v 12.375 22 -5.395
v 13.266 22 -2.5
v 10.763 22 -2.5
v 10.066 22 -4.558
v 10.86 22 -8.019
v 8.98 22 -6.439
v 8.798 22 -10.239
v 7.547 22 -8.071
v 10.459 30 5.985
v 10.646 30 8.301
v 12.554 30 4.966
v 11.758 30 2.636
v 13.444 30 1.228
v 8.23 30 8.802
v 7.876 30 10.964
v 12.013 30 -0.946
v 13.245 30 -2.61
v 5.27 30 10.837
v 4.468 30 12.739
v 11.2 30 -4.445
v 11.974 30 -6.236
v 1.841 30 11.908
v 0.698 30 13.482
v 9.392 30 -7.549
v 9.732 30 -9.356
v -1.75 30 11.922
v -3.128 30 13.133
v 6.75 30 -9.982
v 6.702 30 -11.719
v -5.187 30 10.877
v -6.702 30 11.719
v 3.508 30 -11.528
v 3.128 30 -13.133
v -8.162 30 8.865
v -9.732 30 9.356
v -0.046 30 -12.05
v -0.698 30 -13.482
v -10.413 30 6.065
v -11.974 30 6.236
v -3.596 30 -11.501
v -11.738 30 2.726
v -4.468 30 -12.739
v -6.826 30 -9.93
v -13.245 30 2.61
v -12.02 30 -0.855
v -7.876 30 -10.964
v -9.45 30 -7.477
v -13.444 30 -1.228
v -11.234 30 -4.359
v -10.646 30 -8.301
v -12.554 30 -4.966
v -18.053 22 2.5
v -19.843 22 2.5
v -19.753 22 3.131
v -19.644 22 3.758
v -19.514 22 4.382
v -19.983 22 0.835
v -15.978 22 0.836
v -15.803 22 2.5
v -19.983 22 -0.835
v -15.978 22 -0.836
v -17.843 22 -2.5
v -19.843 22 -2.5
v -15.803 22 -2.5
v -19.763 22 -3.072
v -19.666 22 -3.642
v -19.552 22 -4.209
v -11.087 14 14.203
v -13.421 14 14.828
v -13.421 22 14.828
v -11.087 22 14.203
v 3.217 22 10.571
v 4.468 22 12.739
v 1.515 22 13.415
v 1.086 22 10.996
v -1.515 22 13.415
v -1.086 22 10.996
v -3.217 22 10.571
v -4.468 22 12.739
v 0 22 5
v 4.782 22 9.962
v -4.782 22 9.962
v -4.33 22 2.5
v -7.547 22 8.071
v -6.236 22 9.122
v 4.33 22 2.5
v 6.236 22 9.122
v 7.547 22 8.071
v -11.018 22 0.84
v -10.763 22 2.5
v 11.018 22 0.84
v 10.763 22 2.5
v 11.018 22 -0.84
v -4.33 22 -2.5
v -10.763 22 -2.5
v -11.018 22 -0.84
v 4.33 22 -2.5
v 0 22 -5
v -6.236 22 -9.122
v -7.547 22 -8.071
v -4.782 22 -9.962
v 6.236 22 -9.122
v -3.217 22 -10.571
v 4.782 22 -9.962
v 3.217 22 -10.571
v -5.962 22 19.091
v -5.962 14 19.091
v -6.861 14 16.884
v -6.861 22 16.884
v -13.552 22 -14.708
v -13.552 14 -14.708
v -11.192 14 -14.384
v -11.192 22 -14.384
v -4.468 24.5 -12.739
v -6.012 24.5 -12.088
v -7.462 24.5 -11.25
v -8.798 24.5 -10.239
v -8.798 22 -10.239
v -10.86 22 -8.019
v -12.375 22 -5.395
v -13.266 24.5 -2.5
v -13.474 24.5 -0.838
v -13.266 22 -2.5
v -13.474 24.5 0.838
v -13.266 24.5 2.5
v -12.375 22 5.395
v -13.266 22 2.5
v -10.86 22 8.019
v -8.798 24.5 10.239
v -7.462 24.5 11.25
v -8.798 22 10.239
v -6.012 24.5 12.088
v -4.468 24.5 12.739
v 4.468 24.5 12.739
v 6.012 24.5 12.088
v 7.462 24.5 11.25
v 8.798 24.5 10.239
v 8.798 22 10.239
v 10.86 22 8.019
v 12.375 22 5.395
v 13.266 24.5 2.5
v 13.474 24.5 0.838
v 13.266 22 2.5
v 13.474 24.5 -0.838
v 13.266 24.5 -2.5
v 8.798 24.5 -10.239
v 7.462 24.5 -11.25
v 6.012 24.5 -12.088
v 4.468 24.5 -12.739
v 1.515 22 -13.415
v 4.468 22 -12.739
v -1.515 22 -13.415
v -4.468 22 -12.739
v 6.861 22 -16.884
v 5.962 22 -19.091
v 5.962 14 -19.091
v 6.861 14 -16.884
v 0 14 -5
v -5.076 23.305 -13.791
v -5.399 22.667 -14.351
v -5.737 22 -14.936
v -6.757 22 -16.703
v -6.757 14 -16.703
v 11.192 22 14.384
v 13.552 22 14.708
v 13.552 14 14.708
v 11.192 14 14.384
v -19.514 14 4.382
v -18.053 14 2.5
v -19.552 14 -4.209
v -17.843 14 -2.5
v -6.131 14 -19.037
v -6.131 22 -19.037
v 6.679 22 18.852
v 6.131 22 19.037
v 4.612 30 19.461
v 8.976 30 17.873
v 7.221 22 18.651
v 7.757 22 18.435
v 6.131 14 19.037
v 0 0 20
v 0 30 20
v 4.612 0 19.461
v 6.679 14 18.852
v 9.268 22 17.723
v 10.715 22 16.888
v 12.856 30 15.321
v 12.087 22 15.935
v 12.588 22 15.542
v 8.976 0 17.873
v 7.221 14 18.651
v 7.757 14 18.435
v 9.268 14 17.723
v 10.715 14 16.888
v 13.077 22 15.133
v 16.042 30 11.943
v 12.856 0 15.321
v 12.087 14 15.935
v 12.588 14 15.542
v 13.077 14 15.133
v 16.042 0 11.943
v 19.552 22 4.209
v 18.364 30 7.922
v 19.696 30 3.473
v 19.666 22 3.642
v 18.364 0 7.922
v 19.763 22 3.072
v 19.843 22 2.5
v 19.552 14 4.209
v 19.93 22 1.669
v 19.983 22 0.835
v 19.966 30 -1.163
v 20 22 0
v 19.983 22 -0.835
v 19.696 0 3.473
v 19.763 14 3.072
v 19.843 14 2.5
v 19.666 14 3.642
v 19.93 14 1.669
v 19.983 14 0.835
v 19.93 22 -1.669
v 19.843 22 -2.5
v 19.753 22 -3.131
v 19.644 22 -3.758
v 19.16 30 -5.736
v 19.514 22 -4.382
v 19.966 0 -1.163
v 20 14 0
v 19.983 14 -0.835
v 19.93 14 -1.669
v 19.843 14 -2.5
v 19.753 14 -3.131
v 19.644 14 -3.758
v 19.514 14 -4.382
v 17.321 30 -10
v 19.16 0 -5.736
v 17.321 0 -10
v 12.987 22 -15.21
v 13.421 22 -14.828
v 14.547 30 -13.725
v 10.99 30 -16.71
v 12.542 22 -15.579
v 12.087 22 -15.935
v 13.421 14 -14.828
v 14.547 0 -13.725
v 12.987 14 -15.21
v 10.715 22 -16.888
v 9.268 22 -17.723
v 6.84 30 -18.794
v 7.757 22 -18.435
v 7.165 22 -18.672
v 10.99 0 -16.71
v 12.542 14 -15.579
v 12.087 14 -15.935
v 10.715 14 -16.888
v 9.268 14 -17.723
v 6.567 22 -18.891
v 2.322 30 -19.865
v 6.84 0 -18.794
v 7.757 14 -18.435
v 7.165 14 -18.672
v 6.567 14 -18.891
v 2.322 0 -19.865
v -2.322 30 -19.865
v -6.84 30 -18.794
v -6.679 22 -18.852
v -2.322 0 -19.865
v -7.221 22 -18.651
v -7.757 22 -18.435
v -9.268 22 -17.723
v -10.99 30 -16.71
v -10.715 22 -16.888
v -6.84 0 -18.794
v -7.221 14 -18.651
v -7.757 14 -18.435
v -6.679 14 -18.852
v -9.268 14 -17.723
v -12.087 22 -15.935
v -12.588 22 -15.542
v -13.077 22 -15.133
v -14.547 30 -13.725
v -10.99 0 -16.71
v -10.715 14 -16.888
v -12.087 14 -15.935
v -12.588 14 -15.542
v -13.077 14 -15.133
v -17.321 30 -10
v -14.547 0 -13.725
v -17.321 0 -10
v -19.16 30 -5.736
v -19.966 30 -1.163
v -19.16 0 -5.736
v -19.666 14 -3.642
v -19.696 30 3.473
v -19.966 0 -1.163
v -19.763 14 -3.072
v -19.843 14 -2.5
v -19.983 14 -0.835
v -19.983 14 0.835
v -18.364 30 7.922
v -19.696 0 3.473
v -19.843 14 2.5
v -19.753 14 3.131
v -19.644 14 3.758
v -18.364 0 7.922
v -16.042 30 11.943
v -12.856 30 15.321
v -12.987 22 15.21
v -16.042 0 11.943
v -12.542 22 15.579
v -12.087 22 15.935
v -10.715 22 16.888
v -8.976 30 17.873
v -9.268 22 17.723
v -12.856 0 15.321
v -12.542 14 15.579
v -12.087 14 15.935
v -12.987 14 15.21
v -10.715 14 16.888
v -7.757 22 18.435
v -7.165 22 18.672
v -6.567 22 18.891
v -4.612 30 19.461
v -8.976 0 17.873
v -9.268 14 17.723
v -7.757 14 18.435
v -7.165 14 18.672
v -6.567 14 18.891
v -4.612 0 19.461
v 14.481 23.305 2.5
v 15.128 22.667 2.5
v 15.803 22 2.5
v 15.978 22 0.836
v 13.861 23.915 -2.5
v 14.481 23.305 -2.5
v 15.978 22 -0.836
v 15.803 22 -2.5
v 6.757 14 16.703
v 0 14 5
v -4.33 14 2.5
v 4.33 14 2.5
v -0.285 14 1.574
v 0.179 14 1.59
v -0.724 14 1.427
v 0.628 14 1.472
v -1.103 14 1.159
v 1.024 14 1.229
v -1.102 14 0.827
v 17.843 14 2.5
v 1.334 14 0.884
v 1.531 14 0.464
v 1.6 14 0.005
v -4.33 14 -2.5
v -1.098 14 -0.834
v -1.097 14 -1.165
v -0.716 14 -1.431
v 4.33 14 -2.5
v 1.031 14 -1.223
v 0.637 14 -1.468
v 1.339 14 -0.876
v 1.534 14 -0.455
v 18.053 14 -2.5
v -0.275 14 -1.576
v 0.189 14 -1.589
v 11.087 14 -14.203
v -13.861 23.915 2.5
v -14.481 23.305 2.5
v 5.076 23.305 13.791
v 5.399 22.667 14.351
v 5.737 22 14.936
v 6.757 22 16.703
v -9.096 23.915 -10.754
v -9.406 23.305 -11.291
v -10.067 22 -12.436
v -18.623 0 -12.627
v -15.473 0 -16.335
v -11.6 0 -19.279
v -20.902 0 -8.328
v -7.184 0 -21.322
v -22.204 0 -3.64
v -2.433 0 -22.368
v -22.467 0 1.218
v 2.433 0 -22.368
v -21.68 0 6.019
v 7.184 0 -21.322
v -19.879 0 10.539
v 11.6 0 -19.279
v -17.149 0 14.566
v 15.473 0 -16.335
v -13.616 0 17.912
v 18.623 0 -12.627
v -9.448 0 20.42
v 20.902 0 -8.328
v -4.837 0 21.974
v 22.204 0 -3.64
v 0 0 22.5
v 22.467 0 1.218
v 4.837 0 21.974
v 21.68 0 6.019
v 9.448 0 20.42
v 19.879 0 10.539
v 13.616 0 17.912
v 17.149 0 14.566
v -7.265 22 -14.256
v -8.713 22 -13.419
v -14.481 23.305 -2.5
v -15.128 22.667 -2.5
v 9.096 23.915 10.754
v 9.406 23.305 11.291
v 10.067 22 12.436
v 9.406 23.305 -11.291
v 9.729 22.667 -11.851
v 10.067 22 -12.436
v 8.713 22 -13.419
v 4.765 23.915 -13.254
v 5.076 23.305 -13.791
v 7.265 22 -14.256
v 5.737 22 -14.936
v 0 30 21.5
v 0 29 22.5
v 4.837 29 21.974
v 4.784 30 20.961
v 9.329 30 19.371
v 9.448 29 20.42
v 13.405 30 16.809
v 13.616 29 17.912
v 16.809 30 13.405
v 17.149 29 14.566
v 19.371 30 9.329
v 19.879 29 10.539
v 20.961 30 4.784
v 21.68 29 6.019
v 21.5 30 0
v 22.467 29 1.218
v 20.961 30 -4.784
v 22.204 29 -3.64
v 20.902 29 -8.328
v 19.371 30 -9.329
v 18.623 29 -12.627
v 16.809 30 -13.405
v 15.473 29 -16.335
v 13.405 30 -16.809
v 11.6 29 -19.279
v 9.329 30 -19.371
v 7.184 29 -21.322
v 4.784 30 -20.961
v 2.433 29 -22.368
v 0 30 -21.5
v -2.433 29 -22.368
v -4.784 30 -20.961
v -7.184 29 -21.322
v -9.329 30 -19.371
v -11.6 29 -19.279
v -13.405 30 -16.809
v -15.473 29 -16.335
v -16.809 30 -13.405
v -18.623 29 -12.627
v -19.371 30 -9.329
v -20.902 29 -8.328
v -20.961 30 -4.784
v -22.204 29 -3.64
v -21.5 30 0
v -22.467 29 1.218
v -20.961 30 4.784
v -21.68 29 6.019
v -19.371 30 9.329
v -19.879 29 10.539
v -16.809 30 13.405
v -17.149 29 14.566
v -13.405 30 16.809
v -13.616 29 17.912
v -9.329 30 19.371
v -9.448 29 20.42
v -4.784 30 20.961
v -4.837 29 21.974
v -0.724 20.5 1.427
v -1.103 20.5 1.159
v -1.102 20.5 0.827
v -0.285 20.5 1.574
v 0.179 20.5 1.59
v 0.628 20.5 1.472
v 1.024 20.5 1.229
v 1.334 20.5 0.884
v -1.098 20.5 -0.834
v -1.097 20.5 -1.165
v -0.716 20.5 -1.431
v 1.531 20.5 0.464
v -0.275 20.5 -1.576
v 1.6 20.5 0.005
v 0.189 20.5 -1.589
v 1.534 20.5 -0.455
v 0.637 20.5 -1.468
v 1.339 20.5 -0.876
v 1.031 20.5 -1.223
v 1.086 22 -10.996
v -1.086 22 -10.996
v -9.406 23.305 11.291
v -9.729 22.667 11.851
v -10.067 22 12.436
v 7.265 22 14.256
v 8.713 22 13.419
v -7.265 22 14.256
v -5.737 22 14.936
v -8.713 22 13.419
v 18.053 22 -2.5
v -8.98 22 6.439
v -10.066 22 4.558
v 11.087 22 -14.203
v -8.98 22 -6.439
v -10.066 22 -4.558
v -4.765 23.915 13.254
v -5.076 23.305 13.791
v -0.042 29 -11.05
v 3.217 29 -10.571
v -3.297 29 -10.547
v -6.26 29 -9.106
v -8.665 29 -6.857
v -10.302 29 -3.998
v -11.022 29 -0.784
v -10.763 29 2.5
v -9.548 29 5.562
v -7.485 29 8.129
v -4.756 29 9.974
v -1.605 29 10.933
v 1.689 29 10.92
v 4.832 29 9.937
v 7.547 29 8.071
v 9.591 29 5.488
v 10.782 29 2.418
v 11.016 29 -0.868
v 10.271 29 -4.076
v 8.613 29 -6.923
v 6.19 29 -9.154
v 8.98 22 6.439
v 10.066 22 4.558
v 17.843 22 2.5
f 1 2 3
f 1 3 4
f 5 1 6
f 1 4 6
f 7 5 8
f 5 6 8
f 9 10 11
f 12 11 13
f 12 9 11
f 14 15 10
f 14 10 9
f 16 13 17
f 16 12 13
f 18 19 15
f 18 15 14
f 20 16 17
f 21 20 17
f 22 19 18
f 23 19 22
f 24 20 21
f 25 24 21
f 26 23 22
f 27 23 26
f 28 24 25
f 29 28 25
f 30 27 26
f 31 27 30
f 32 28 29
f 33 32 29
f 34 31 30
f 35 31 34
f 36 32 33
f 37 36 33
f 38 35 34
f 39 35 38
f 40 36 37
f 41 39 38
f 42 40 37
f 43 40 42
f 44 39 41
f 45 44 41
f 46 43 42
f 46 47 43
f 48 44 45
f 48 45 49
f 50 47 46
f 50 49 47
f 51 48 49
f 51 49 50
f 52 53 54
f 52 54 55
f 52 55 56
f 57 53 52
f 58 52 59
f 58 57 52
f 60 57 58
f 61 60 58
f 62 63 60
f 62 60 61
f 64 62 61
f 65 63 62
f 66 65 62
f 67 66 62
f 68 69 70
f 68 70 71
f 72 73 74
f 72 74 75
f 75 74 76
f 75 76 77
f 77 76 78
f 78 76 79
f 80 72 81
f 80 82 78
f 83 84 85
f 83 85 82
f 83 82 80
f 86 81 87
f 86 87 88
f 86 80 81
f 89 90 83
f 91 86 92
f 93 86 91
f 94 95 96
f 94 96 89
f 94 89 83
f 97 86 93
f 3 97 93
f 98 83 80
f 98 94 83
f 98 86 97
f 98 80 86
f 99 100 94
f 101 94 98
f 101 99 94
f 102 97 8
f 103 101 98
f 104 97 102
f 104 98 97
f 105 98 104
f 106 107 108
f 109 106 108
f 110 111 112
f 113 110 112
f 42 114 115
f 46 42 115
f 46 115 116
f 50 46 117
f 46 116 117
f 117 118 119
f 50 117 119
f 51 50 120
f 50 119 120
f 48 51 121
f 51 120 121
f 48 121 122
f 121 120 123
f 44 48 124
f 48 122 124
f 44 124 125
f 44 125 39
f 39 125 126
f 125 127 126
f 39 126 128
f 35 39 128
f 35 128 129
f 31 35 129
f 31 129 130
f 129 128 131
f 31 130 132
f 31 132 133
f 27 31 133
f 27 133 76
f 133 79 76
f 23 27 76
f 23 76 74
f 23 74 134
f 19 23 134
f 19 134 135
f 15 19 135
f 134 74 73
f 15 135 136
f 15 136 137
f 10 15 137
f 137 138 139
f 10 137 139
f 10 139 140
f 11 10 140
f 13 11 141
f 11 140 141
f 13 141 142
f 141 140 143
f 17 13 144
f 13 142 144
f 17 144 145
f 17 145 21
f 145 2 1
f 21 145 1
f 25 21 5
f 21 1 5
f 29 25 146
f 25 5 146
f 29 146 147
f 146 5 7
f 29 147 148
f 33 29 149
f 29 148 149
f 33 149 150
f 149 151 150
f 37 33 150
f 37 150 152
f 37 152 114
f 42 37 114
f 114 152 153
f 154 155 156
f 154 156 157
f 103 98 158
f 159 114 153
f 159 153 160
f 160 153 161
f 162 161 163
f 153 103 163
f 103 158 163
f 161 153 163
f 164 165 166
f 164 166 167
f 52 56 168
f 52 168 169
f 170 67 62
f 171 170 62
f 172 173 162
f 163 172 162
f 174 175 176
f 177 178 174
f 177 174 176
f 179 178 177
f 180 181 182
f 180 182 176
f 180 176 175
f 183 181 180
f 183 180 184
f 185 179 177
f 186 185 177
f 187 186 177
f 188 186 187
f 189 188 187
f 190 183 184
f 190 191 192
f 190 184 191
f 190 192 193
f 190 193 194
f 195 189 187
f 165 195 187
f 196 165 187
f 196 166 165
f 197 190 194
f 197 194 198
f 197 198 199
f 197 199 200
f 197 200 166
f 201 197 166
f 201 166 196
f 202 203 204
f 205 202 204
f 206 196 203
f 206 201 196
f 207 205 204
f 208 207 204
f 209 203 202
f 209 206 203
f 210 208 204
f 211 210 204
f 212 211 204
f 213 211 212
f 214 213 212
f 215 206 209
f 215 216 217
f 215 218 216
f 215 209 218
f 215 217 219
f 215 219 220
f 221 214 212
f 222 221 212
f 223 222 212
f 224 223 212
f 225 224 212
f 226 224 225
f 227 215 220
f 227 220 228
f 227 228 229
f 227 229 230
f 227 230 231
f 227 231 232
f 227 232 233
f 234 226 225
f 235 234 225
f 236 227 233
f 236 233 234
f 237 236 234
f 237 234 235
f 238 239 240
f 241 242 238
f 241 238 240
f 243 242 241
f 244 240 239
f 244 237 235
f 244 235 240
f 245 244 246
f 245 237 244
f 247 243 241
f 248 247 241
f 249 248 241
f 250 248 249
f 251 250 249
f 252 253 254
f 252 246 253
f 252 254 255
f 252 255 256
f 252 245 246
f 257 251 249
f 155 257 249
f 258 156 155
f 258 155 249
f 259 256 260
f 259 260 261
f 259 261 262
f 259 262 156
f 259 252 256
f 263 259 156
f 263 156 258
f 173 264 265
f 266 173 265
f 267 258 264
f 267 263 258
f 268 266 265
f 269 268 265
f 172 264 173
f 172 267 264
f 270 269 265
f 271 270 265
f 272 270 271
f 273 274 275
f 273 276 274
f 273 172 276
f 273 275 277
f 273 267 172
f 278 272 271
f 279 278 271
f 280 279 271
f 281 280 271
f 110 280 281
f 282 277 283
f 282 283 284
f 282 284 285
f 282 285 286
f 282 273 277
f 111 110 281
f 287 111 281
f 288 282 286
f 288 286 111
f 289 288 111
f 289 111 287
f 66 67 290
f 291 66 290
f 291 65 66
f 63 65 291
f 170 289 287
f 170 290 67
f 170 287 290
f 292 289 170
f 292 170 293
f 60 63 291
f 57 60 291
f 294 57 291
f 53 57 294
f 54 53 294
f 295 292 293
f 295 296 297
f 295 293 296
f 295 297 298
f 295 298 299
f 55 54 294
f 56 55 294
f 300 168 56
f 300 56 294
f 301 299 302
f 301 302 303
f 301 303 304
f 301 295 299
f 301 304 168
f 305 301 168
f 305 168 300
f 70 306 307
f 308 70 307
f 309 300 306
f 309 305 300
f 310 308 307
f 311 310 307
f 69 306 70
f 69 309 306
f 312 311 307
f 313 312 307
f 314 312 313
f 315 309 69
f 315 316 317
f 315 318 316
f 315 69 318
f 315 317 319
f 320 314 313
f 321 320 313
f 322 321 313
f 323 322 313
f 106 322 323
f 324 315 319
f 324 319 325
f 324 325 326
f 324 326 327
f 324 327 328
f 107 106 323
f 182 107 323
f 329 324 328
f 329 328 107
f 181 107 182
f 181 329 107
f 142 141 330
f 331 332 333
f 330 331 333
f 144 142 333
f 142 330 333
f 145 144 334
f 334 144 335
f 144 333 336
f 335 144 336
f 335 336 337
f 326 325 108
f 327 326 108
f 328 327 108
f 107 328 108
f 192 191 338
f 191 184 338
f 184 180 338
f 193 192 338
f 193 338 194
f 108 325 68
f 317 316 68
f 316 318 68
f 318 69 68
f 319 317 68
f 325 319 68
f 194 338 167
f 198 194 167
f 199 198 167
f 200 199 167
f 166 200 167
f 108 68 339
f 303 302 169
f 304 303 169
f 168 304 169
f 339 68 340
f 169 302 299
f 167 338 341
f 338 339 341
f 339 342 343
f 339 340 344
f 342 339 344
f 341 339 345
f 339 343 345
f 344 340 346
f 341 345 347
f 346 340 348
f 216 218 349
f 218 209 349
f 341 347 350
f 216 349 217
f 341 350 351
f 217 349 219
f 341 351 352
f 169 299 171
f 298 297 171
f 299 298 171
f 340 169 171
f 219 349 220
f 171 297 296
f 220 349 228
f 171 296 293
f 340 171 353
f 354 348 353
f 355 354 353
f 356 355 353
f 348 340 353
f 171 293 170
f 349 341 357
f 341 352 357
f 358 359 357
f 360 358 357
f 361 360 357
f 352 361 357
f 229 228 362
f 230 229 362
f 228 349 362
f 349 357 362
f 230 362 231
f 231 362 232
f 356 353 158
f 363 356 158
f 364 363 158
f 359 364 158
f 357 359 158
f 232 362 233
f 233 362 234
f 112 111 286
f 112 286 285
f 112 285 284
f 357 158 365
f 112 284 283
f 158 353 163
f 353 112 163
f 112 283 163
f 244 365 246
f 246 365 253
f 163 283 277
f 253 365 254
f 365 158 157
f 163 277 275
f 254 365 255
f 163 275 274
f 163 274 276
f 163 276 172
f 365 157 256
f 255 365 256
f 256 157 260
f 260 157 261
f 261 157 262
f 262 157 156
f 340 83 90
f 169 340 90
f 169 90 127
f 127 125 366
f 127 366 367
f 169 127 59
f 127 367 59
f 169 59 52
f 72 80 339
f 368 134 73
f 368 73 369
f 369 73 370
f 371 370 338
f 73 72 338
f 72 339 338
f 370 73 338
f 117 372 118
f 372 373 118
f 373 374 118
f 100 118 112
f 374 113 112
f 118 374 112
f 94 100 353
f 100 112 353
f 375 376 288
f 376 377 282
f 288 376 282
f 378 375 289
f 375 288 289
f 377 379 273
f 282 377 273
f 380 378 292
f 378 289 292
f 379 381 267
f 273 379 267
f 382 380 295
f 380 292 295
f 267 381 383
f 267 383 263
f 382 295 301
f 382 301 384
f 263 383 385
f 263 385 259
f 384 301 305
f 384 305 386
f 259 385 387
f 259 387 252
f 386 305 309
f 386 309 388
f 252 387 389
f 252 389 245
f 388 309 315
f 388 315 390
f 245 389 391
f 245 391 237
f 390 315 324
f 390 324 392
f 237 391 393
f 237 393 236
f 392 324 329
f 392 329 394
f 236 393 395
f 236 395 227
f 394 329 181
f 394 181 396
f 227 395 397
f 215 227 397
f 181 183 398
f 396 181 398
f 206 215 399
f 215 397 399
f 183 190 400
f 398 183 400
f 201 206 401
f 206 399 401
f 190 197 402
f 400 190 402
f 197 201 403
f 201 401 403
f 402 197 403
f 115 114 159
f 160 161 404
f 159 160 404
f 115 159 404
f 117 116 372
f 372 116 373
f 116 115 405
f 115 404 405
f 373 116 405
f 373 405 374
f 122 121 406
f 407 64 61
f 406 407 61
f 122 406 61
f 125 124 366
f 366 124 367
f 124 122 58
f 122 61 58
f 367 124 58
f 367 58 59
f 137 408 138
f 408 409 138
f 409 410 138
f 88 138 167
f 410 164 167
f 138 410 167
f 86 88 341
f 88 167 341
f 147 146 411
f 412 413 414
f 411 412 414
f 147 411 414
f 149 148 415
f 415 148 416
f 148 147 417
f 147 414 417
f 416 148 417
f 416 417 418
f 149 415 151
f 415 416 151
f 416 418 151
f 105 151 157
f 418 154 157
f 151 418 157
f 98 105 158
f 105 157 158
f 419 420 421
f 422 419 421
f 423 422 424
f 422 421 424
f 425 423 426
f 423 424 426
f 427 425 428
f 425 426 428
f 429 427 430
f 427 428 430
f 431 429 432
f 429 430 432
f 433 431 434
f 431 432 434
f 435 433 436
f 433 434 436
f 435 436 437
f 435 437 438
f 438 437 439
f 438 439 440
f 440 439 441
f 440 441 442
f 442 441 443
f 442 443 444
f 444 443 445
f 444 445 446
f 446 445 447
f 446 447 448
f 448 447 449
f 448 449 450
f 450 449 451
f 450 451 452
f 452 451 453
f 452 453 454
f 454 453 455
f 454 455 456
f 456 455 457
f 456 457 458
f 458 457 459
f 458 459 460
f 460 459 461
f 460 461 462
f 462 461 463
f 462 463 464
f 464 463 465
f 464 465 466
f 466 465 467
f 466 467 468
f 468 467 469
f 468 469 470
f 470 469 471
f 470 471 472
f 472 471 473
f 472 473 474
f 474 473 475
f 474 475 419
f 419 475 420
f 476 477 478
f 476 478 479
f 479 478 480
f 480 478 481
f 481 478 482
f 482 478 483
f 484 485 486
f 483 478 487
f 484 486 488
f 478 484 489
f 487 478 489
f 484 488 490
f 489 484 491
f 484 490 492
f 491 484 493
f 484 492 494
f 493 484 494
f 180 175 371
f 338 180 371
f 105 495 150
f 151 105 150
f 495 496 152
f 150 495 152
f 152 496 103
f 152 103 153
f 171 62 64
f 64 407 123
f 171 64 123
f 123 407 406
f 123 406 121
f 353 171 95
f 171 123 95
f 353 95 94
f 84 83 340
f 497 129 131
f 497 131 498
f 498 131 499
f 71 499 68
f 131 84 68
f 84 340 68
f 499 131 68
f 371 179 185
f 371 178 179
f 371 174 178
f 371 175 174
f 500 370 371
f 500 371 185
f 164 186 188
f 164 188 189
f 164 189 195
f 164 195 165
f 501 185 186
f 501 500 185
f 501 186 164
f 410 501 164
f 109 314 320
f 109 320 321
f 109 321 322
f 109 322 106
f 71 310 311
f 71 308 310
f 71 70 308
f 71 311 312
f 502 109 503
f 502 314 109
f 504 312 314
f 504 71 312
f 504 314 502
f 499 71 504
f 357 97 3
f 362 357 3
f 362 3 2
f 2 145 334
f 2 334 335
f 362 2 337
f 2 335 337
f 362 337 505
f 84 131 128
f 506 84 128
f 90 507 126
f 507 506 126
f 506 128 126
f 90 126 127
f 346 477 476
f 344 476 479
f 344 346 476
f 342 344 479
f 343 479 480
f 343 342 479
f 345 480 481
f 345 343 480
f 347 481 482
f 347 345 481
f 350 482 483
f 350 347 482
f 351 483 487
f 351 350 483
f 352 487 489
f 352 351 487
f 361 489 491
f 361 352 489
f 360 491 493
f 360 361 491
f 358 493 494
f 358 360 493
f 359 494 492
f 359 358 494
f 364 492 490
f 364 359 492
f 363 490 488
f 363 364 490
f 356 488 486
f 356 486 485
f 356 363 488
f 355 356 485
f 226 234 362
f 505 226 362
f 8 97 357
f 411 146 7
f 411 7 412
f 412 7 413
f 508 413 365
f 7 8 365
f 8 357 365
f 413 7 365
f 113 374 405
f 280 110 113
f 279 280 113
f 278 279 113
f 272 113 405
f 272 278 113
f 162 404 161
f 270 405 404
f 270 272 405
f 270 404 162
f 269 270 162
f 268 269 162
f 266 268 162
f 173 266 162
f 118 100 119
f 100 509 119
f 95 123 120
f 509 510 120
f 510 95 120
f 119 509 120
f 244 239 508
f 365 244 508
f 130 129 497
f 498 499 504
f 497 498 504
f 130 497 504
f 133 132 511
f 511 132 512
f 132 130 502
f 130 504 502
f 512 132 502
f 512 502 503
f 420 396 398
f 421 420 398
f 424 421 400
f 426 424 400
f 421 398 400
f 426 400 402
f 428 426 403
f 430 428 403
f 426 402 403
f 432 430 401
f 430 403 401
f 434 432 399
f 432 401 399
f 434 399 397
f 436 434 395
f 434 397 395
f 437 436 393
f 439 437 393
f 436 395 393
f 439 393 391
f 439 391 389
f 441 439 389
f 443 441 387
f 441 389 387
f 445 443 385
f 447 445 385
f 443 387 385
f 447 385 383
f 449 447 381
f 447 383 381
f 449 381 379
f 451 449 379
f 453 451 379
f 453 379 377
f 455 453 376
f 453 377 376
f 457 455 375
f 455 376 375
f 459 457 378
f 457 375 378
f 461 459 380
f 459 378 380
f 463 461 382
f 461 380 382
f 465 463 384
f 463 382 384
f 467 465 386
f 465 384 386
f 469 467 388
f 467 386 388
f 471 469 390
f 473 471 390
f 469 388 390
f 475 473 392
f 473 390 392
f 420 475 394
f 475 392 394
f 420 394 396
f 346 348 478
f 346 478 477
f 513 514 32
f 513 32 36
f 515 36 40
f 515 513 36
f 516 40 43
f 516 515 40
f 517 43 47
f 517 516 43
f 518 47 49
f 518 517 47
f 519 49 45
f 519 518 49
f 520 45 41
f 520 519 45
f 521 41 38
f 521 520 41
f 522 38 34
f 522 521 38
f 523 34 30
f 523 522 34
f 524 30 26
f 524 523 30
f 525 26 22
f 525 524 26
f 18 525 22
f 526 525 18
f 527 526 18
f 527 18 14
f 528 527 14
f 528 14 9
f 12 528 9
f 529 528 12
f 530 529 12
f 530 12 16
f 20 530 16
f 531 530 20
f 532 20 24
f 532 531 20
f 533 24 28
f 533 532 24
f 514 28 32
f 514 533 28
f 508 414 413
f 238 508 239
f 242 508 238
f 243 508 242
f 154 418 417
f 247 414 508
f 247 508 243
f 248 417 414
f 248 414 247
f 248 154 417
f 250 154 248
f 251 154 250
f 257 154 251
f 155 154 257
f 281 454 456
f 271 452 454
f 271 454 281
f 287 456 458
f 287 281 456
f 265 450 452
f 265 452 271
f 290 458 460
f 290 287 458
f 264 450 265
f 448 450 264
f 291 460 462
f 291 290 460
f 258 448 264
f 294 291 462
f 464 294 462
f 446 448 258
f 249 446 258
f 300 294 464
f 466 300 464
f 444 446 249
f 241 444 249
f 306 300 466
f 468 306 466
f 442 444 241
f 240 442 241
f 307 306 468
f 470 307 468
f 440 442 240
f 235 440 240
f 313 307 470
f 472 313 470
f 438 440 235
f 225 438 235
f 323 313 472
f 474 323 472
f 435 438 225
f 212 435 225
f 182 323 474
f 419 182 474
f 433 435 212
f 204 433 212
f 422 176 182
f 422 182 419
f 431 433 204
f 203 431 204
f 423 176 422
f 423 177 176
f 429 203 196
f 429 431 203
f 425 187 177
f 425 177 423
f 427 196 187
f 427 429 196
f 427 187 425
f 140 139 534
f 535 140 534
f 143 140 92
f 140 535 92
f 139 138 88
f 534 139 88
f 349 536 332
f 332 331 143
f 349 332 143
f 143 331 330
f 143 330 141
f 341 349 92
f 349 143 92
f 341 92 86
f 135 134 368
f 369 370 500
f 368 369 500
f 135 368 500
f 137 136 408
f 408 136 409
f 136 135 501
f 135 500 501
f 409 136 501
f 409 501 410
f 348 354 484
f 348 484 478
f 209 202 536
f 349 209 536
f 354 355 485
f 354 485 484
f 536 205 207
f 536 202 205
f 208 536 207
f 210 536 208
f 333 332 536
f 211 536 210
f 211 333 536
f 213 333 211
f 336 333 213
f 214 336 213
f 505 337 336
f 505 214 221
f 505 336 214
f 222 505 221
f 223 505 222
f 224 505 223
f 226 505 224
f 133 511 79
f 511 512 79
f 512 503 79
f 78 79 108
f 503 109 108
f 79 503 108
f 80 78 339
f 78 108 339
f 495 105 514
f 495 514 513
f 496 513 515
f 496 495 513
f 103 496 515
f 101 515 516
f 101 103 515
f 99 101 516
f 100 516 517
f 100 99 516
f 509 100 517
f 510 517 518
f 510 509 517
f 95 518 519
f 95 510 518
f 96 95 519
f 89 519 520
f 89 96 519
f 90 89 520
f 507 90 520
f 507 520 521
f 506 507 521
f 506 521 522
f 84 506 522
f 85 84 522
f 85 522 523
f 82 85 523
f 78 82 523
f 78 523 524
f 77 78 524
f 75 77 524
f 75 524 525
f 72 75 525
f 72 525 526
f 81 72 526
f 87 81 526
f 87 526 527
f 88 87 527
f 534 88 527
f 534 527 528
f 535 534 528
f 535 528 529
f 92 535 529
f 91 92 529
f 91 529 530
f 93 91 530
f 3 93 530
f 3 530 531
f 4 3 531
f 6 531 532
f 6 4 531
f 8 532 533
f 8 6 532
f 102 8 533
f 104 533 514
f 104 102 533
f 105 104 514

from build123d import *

# Parameters (mm, degrees)
SKETCH1_R               = 22.5
SKETCH1_R_2             = 20
BOSS_EXTRUDE1_DEPTH     = 30
BOSS_EXTRUDE2_DEPTH     = 4
CHAMFER1_SIZE           = 2
CHAMFER1_SIZE_2         = 1.79025908
CUT_EXTRUDE1_DEPTH      = 39.684622268
CUT_EXTRUDE1_DEPTH_BACK = 39.684622268
BOSS_EXTRUDE3_START     = -1.5
BOSS_EXTRUDE3_DEPTH     = 1.5
SKETCH6_R               = 13.5
SKETCH6_R_2             = 11.05
BOSS_EXTRUDE4_DEPTH     = 8
CHAMFER2_SIZE           = 1
CHAMFER3_SIZE           = 1
CHAMFER4_SIZE           = 2.5


with BuildPart() as part:
    # Sketch1 → Boss-Extrude1 (new body)
    with BuildSketch(Plane(origin=(0, 0, 0), x_dir=(1, 0, 0), z_dir=(0, 1, 0))):
        with Locations(Location((0, 0, 0), (0, 0, 270))):
            Circle(SKETCH1_R)
        with Locations(Location((0, 0, 0), (0, 0, 270))):
            Circle(SKETCH1_R_2, mode=Mode.SUBTRACT)
    extrude(amount=BOSS_EXTRUDE1_DEPTH)

    # Sketch2 → Boss-Extrude2 (add, symmetric)
    with BuildSketch(Plane(origin=(0, 18, 0), x_dir=(1, 0, 0), z_dir=(0, 1, 0))):
        with BuildLine():
            Line((-12.086630926, 15.934658856), (-4.330127019, 2.5))
            Line((-4.330127019, 2.5), (-19.843134833, 2.5))
            ThreePointArc((-19.843134833, 2.5), (-20, 0), (-19.843134833, -2.5))
            Line((-19.843134833, -2.5), (-4.330127019, -2.5))
            Line((-4.330127019, -2.5), (-12.086630926, -15.934658856))
            ThreePointArc((-12.086630926, -15.934658856), (-10, -17.320508076), (-7.756503907, -18.434658856))
            Line((-7.756503907, -18.434658856), (0, -5))
            Line((0, -5), (7.756503907, -18.434658856))
            ThreePointArc((7.756503907, -18.434658856), (10, -17.320508076), (12.086630926, -15.934658856))
            Line((12.086630926, -15.934658856), (4.330127019, -2.5))
            Line((4.330127019, -2.5), (19.843134833, -2.5))
            ThreePointArc((19.843134833, -2.5), (19.960745185, -1.252458251), (20, 0))
            ThreePointArc((20, 0), (19.960745185, 1.252458251), (19.843134833, 2.5))
            Line((19.843134833, 2.5), (4.330127019, 2.5))
            Line((4.330127019, 2.5), (12.086630926, 15.934658856))
            ThreePointArc((12.086630926, 15.934658856), (10, 17.320508076), (7.756503907, 18.434658856))
            Line((7.756503907, 18.434658856), (0, 5))
            Line((0, 5), (-7.756503907, 18.434658856))
            ThreePointArc((-7.756503907, 18.434658856), (-10, 17.320508076), (-12.086630926, 15.934658856))
        make_face()
    extrude(amount=BOSS_EXTRUDE2_DEPTH, both=True)

    # Chamfer1
    # the kernel refuses this chamfer: 2, 1.79025908 mm, written as the material it adds along each edge
    with BuildSketch(Plane(origin=(7.756503907, 22, 18.434658856), x_dir=(-0.9376749432180777, 0, 0.34751359809505994), z_dir=(0, -1, 0)), Plane(origin=(19.843134833, 22, 2.5), x_dir=(-0.16788186749818226, 0, 0.9858071203665161), z_dir=(0, -1, 0)), Plane(origin=(12.086630926, 22, -15.934658856), x_dir=(0.7697930757198956, 0, 0.6382935222714571), z_dir=(0, -1, 0)), Plane(origin=(-7.756503907, 22, -18.434658856), x_dir=(0.9376749432180783, 0, -0.34751359809505833), z_dir=(0, -1, 0)), Plane(origin=(-19.843134833, 22, -2.5), x_dir=(0.1678818674981782, 0, -0.9858071203665167), z_dir=(0, -1, 0)), Plane(origin=(-12.086630926, 22, 15.934658856), x_dir=(-0.7697930757198955, 0, -0.6382935222714572), z_dir=(0, -1, 0))) as chamfer1_piece_1:
        with BuildLine():
            Line((1.733569464, 0), (CHAMFER1_SIZE * 0.167881867498, CHAMFER1_SIZE * 0.985807120367))
            Line((CHAMFER1_SIZE * 0.167881867498, CHAMFER1_SIZE * 0.985807120367), (0, 0))
            ThreePointArc((0, 0), (0.889903139, -0.018778361), (1.733569464, 0))
        make_face()
    extrude(amount=8)
    with BuildSketch(Plane(origin=(12.086630926, 14, 15.934658856), x_dir=(0.7669529363679002, 0, -0.6417033531131466), z_dir=(0, 1, 0)), Plane(origin=(19.843134833, 14, -2.5), x_dir=(-0.17225493730569186, 0, -0.9850524029582447), z_dir=(0, 1, 0)), Plane(origin=(7.756503907, 14, -18.434658856), x_dir=(-0.9392078736735914, 0, -0.3433490498450975), z_dir=(0, 1, 0)), Plane(origin=(-12.086630926, 14, -15.934658856), x_dir=(-0.766952936367899, 0, 0.641703353113148), z_dir=(0, 1, 0)), Plane(origin=(-19.843134833, 14, 2.5), x_dir=(0.17225493730568892, 0, 0.9850524029582453), z_dir=(0, 1, 0)), Plane(origin=(-7.756503907, 14, 18.434658856), x_dir=(0.9392078736735913, 0, 0.3433490498450977), z_dir=(0, 1, 0))) as chamfer1_piece_2:
        with BuildLine():
            Line((1.910893878, 0), (CHAMFER1_SIZE_2 * 0.172254937261, CHAMFER1_SIZE_2 * 0.985052402702))
            Line((CHAMFER1_SIZE_2 * 0.172254937261, CHAMFER1_SIZE_2 * 0.985052402702), (0, 0))
            ThreePointArc((0, 0), (0.982338586, -0.022816928), (1.910893878, 0))
        make_face()
    extrude(amount=8)

    # Sketch4 → Cut-Extrude1 (cut, two sides: drawn at the far end of the back side and taken through both)
    with BuildSketch(Plane(origin=(0, 22, 0), x_dir=(1, 0, 0), z_dir=(0, 1, 0)).offset(-CUT_EXTRUDE1_DEPTH_BACK)):
        with BuildLine():
            Line((-1.09656677, 1.165135752), (-1.097544149, 0.833904576))
            Line((-1.097544149, 0.833904576), (-1.102446274, -0.827412964))
            Line((-1.102446274, -0.827412964), (-1.103423653, -1.15864414))
            ThreePointArc((-1.103423653, -1.15864414), (1.599993035, -0.004721172), (-1.09656677, 1.165135752))
        make_face()
    extrude(amount=CUT_EXTRUDE1_DEPTH + CUT_EXTRUDE1_DEPTH_BACK, mode=Mode.SUBTRACT)

    # Sketch5 → Boss-Extrude3 (add)
    with BuildSketch(Plane(origin=(0, 22, 0), x_dir=(1, 0, 0), z_dir=(0, 1, 0)).offset(BOSS_EXTRUDE3_START)):
        with BuildLine():
            Line((-1.09656677, 1.165135752), (-1.103423653, -1.15864414))
            ThreePointArc((-1.103423653, -1.15864414), (1.599993035, -0.004721172), (-1.09656677, 1.165135752))
        make_face()
    extrude(amount=BOSS_EXTRUDE3_DEPTH)

    # Sketch6 → Boss-Extrude4 (add)
    with BuildSketch(Plane(origin=(0, 22, 0), x_dir=(1, 0, 0), z_dir=(0, 1, 0))):
        with Locations(Location((0, 0, 0), (0, 0, 109.328070714))):
            Circle(SKETCH6_R)
        with Locations(Location((0, 0, 0), (0, 0, 73.076060846))):
            Circle(SKETCH6_R_2, mode=Mode.SUBTRACT)
    extrude(amount=BOSS_EXTRUDE4_DEPTH)

    # Chamfer2
    chamfer2_edges = [part.edges().sort_by_distance(p)[0] for p in [
        (0, 30, -22.5),
    ]]
    chamfer(chamfer2_edges, length=CHAMFER2_SIZE)

    # Chamfer3
    chamfer3_edges = [part.edges().sort_by_distance(p)[0] for p in [
        (-3.216676451, 30, 10.571447044),
    ]]
    chamfer(chamfer3_edges, length=CHAMFER3_SIZE)

    # Chamfer4
    # the kernel refuses this chamfer: 2.5 mm, written as the material it adds along each edge
    with BuildSketch(Plane(origin=(0, 22, 0), x_dir=(0.7884516512749685, 0, 0.6150967351577924), z_dir=(-0.6150967351577924, 0, 0.7884516512749685))) as chamfer4_piece_1_section:
        Polygon((13.5, CHAMFER4_SIZE), (13.5 + CHAMFER4_SIZE, 0), (13.5, 0), align=None)
    chamfer4_piece_1 = revolve(axis=Axis((0, 22, 0), (0, 1, 0)), revolution_arc=75.917899148, mode=Mode.PRIVATE)
    chamfer4_piece_1 = split(chamfer4_piece_1, bisect_by=Plane(origin=(0, 22, 2.5), z_dir=(0, 0, -1)), keep=Keep.TOP, mode=Mode.PRIVATE)
    chamfer4_piece_1 = split(chamfer4_piece_1, bisect_by=Plane(origin=(0, 22, -2.5), z_dir=(0, 0, 1)), keep=Keep.TOP, mode=Mode.PRIVATE)
    add(chamfer4_piece_1)
    with BuildSketch(Plane(origin=(0, 22, 0), x_dir=(0.9269152240690147, 0, -0.3752707920809829), z_dir=(0.3752707920809829, 0, 0.9269152240690147))) as chamfer4_piece_2_section:
        Polygon((13.5, CHAMFER4_SIZE), (13.5 + CHAMFER4_SIZE, 0), (13.5, 0), align=None)
    chamfer4_piece_2 = revolve(axis=Axis((0, 22, 0), (0, 1, 0)), revolution_arc=75.917899148, mode=Mode.PRIVATE)
    chamfer4_piece_2 = split(chamfer4_piece_2, bisect_by=Plane(origin=(2.165063509, 22, 1.25), z_dir=(-0.8660254037844385, 0, -0.5000000000000003)), keep=Keep.TOP, mode=Mode.PRIVATE)
    chamfer4_piece_2 = split(chamfer4_piece_2, bisect_by=Plane(origin=(-2.165063509, 22, -1.25), z_dir=(0.8660254037844383, 0, 0.5000000000000009)), keep=Keep.TOP, mode=Mode.PRIVATE)
    add(chamfer4_piece_2)
    with BuildSketch(Plane(origin=(0, 22, 0), x_dir=(0.138463572798161, 0, -0.9903675272382311), z_dir=(0.9903675272382311, 0, 0.138463572798161))) as chamfer4_piece_3_section:
        Polygon((13.5, CHAMFER4_SIZE), (13.5 + CHAMFER4_SIZE, 0), (13.5, 0), align=None)
    chamfer4_piece_3 = revolve(axis=Axis((0, 22, 0), (0, 1, 0)), revolution_arc=75.917899148, mode=Mode.PRIVATE)
    chamfer4_piece_3 = split(chamfer4_piece_3, bisect_by=Plane(origin=(-2.165063509, 22, 1.25), z_dir=(0.8660254037844393, 0, -0.49999999999999906)), keep=Keep.TOP, mode=Mode.PRIVATE)
    chamfer4_piece_3 = split(chamfer4_piece_3, bisect_by=Plane(origin=(2.165063509, 22, -1.25), z_dir=(-0.8660254037844392, 0, 0.49999999999999917)), keep=Keep.TOP, mode=Mode.PRIVATE)
    add(chamfer4_piece_3)
    with BuildSketch(Plane(origin=(0, 22, 0), x_dir=(-0.788451651274934, 0, -0.6150967351578366), z_dir=(0.6150967351578366, 0, -0.788451651274934))) as chamfer4_piece_4_section:
        Polygon((13.5, CHAMFER4_SIZE), (13.5 + CHAMFER4_SIZE, 0), (13.5, 0), align=None)
    chamfer4_piece_4 = revolve(axis=Axis((0, 22, 0), (0, 1, 0)), revolution_arc=75.917899148, mode=Mode.PRIVATE)
    chamfer4_piece_4 = split(chamfer4_piece_4, bisect_by=Plane(origin=(0, 22, -2.5), z_dir=(0, 0, 1)), keep=Keep.TOP, mode=Mode.PRIVATE)
    chamfer4_piece_4 = split(chamfer4_piece_4, bisect_by=Plane(origin=(0, 22, 2.5), z_dir=(0, 0, -1)), keep=Keep.TOP, mode=Mode.PRIVATE)
    add(chamfer4_piece_4)
    with BuildSketch(Plane(origin=(0, 22, 0), x_dir=(-0.9269152240690146, 0, 0.375270792080983), z_dir=(-0.375270792080983, 0, -0.9269152240690146))) as chamfer4_piece_5_section:
        Polygon((13.5, CHAMFER4_SIZE), (13.5 + CHAMFER4_SIZE, 0), (13.5, 0), align=None)
    chamfer4_piece_5 = revolve(axis=Axis((0, 22, 0), (0, 1, 0)), revolution_arc=75.917899148, mode=Mode.PRIVATE)
    chamfer4_piece_5 = split(chamfer4_piece_5, bisect_by=Plane(origin=(-2.165063509, 22, -1.25), z_dir=(0.8660254037844384, 0, 0.5000000000000006)), keep=Keep.TOP, mode=Mode.PRIVATE)
    chamfer4_piece_5 = split(chamfer4_piece_5, bisect_by=Plane(origin=(2.165063509, 22, 1.25), z_dir=(-0.8660254037844386, 0, -0.5000000000000003)), keep=Keep.TOP, mode=Mode.PRIVATE)
    add(chamfer4_piece_5)
    with BuildSketch(Plane(origin=(0, 22, 0), x_dir=(-0.13846357279405325, 0, 0.9903675272388054), z_dir=(-0.9903675272388054, 0, -0.13846357279405325))) as chamfer4_piece_6_section:
        Polygon((13.5, CHAMFER4_SIZE), (13.5 + CHAMFER4_SIZE, 0), (13.5, 0), align=None)
    chamfer4_piece_6 = revolve(axis=Axis((0, 22, 0), (0, 1, 0)), revolution_arc=75.917899148, mode=Mode.PRIVATE)
    chamfer4_piece_6 = split(chamfer4_piece_6, bisect_by=Plane(origin=(-2.165063509, 22, 1.25), z_dir=(0.8660254037844392, 0, -0.4999999999999992)), keep=Keep.TOP, mode=Mode.PRIVATE)
    chamfer4_piece_6 = split(chamfer4_piece_6, bisect_by=Plane(origin=(2.165063509, 22, -1.25), z_dir=(-0.866025403784439, 0, 0.4999999999999993)), keep=Keep.TOP, mode=Mode.PRIVATE)
    add(chamfer4_piece_6)


solid = part.part
